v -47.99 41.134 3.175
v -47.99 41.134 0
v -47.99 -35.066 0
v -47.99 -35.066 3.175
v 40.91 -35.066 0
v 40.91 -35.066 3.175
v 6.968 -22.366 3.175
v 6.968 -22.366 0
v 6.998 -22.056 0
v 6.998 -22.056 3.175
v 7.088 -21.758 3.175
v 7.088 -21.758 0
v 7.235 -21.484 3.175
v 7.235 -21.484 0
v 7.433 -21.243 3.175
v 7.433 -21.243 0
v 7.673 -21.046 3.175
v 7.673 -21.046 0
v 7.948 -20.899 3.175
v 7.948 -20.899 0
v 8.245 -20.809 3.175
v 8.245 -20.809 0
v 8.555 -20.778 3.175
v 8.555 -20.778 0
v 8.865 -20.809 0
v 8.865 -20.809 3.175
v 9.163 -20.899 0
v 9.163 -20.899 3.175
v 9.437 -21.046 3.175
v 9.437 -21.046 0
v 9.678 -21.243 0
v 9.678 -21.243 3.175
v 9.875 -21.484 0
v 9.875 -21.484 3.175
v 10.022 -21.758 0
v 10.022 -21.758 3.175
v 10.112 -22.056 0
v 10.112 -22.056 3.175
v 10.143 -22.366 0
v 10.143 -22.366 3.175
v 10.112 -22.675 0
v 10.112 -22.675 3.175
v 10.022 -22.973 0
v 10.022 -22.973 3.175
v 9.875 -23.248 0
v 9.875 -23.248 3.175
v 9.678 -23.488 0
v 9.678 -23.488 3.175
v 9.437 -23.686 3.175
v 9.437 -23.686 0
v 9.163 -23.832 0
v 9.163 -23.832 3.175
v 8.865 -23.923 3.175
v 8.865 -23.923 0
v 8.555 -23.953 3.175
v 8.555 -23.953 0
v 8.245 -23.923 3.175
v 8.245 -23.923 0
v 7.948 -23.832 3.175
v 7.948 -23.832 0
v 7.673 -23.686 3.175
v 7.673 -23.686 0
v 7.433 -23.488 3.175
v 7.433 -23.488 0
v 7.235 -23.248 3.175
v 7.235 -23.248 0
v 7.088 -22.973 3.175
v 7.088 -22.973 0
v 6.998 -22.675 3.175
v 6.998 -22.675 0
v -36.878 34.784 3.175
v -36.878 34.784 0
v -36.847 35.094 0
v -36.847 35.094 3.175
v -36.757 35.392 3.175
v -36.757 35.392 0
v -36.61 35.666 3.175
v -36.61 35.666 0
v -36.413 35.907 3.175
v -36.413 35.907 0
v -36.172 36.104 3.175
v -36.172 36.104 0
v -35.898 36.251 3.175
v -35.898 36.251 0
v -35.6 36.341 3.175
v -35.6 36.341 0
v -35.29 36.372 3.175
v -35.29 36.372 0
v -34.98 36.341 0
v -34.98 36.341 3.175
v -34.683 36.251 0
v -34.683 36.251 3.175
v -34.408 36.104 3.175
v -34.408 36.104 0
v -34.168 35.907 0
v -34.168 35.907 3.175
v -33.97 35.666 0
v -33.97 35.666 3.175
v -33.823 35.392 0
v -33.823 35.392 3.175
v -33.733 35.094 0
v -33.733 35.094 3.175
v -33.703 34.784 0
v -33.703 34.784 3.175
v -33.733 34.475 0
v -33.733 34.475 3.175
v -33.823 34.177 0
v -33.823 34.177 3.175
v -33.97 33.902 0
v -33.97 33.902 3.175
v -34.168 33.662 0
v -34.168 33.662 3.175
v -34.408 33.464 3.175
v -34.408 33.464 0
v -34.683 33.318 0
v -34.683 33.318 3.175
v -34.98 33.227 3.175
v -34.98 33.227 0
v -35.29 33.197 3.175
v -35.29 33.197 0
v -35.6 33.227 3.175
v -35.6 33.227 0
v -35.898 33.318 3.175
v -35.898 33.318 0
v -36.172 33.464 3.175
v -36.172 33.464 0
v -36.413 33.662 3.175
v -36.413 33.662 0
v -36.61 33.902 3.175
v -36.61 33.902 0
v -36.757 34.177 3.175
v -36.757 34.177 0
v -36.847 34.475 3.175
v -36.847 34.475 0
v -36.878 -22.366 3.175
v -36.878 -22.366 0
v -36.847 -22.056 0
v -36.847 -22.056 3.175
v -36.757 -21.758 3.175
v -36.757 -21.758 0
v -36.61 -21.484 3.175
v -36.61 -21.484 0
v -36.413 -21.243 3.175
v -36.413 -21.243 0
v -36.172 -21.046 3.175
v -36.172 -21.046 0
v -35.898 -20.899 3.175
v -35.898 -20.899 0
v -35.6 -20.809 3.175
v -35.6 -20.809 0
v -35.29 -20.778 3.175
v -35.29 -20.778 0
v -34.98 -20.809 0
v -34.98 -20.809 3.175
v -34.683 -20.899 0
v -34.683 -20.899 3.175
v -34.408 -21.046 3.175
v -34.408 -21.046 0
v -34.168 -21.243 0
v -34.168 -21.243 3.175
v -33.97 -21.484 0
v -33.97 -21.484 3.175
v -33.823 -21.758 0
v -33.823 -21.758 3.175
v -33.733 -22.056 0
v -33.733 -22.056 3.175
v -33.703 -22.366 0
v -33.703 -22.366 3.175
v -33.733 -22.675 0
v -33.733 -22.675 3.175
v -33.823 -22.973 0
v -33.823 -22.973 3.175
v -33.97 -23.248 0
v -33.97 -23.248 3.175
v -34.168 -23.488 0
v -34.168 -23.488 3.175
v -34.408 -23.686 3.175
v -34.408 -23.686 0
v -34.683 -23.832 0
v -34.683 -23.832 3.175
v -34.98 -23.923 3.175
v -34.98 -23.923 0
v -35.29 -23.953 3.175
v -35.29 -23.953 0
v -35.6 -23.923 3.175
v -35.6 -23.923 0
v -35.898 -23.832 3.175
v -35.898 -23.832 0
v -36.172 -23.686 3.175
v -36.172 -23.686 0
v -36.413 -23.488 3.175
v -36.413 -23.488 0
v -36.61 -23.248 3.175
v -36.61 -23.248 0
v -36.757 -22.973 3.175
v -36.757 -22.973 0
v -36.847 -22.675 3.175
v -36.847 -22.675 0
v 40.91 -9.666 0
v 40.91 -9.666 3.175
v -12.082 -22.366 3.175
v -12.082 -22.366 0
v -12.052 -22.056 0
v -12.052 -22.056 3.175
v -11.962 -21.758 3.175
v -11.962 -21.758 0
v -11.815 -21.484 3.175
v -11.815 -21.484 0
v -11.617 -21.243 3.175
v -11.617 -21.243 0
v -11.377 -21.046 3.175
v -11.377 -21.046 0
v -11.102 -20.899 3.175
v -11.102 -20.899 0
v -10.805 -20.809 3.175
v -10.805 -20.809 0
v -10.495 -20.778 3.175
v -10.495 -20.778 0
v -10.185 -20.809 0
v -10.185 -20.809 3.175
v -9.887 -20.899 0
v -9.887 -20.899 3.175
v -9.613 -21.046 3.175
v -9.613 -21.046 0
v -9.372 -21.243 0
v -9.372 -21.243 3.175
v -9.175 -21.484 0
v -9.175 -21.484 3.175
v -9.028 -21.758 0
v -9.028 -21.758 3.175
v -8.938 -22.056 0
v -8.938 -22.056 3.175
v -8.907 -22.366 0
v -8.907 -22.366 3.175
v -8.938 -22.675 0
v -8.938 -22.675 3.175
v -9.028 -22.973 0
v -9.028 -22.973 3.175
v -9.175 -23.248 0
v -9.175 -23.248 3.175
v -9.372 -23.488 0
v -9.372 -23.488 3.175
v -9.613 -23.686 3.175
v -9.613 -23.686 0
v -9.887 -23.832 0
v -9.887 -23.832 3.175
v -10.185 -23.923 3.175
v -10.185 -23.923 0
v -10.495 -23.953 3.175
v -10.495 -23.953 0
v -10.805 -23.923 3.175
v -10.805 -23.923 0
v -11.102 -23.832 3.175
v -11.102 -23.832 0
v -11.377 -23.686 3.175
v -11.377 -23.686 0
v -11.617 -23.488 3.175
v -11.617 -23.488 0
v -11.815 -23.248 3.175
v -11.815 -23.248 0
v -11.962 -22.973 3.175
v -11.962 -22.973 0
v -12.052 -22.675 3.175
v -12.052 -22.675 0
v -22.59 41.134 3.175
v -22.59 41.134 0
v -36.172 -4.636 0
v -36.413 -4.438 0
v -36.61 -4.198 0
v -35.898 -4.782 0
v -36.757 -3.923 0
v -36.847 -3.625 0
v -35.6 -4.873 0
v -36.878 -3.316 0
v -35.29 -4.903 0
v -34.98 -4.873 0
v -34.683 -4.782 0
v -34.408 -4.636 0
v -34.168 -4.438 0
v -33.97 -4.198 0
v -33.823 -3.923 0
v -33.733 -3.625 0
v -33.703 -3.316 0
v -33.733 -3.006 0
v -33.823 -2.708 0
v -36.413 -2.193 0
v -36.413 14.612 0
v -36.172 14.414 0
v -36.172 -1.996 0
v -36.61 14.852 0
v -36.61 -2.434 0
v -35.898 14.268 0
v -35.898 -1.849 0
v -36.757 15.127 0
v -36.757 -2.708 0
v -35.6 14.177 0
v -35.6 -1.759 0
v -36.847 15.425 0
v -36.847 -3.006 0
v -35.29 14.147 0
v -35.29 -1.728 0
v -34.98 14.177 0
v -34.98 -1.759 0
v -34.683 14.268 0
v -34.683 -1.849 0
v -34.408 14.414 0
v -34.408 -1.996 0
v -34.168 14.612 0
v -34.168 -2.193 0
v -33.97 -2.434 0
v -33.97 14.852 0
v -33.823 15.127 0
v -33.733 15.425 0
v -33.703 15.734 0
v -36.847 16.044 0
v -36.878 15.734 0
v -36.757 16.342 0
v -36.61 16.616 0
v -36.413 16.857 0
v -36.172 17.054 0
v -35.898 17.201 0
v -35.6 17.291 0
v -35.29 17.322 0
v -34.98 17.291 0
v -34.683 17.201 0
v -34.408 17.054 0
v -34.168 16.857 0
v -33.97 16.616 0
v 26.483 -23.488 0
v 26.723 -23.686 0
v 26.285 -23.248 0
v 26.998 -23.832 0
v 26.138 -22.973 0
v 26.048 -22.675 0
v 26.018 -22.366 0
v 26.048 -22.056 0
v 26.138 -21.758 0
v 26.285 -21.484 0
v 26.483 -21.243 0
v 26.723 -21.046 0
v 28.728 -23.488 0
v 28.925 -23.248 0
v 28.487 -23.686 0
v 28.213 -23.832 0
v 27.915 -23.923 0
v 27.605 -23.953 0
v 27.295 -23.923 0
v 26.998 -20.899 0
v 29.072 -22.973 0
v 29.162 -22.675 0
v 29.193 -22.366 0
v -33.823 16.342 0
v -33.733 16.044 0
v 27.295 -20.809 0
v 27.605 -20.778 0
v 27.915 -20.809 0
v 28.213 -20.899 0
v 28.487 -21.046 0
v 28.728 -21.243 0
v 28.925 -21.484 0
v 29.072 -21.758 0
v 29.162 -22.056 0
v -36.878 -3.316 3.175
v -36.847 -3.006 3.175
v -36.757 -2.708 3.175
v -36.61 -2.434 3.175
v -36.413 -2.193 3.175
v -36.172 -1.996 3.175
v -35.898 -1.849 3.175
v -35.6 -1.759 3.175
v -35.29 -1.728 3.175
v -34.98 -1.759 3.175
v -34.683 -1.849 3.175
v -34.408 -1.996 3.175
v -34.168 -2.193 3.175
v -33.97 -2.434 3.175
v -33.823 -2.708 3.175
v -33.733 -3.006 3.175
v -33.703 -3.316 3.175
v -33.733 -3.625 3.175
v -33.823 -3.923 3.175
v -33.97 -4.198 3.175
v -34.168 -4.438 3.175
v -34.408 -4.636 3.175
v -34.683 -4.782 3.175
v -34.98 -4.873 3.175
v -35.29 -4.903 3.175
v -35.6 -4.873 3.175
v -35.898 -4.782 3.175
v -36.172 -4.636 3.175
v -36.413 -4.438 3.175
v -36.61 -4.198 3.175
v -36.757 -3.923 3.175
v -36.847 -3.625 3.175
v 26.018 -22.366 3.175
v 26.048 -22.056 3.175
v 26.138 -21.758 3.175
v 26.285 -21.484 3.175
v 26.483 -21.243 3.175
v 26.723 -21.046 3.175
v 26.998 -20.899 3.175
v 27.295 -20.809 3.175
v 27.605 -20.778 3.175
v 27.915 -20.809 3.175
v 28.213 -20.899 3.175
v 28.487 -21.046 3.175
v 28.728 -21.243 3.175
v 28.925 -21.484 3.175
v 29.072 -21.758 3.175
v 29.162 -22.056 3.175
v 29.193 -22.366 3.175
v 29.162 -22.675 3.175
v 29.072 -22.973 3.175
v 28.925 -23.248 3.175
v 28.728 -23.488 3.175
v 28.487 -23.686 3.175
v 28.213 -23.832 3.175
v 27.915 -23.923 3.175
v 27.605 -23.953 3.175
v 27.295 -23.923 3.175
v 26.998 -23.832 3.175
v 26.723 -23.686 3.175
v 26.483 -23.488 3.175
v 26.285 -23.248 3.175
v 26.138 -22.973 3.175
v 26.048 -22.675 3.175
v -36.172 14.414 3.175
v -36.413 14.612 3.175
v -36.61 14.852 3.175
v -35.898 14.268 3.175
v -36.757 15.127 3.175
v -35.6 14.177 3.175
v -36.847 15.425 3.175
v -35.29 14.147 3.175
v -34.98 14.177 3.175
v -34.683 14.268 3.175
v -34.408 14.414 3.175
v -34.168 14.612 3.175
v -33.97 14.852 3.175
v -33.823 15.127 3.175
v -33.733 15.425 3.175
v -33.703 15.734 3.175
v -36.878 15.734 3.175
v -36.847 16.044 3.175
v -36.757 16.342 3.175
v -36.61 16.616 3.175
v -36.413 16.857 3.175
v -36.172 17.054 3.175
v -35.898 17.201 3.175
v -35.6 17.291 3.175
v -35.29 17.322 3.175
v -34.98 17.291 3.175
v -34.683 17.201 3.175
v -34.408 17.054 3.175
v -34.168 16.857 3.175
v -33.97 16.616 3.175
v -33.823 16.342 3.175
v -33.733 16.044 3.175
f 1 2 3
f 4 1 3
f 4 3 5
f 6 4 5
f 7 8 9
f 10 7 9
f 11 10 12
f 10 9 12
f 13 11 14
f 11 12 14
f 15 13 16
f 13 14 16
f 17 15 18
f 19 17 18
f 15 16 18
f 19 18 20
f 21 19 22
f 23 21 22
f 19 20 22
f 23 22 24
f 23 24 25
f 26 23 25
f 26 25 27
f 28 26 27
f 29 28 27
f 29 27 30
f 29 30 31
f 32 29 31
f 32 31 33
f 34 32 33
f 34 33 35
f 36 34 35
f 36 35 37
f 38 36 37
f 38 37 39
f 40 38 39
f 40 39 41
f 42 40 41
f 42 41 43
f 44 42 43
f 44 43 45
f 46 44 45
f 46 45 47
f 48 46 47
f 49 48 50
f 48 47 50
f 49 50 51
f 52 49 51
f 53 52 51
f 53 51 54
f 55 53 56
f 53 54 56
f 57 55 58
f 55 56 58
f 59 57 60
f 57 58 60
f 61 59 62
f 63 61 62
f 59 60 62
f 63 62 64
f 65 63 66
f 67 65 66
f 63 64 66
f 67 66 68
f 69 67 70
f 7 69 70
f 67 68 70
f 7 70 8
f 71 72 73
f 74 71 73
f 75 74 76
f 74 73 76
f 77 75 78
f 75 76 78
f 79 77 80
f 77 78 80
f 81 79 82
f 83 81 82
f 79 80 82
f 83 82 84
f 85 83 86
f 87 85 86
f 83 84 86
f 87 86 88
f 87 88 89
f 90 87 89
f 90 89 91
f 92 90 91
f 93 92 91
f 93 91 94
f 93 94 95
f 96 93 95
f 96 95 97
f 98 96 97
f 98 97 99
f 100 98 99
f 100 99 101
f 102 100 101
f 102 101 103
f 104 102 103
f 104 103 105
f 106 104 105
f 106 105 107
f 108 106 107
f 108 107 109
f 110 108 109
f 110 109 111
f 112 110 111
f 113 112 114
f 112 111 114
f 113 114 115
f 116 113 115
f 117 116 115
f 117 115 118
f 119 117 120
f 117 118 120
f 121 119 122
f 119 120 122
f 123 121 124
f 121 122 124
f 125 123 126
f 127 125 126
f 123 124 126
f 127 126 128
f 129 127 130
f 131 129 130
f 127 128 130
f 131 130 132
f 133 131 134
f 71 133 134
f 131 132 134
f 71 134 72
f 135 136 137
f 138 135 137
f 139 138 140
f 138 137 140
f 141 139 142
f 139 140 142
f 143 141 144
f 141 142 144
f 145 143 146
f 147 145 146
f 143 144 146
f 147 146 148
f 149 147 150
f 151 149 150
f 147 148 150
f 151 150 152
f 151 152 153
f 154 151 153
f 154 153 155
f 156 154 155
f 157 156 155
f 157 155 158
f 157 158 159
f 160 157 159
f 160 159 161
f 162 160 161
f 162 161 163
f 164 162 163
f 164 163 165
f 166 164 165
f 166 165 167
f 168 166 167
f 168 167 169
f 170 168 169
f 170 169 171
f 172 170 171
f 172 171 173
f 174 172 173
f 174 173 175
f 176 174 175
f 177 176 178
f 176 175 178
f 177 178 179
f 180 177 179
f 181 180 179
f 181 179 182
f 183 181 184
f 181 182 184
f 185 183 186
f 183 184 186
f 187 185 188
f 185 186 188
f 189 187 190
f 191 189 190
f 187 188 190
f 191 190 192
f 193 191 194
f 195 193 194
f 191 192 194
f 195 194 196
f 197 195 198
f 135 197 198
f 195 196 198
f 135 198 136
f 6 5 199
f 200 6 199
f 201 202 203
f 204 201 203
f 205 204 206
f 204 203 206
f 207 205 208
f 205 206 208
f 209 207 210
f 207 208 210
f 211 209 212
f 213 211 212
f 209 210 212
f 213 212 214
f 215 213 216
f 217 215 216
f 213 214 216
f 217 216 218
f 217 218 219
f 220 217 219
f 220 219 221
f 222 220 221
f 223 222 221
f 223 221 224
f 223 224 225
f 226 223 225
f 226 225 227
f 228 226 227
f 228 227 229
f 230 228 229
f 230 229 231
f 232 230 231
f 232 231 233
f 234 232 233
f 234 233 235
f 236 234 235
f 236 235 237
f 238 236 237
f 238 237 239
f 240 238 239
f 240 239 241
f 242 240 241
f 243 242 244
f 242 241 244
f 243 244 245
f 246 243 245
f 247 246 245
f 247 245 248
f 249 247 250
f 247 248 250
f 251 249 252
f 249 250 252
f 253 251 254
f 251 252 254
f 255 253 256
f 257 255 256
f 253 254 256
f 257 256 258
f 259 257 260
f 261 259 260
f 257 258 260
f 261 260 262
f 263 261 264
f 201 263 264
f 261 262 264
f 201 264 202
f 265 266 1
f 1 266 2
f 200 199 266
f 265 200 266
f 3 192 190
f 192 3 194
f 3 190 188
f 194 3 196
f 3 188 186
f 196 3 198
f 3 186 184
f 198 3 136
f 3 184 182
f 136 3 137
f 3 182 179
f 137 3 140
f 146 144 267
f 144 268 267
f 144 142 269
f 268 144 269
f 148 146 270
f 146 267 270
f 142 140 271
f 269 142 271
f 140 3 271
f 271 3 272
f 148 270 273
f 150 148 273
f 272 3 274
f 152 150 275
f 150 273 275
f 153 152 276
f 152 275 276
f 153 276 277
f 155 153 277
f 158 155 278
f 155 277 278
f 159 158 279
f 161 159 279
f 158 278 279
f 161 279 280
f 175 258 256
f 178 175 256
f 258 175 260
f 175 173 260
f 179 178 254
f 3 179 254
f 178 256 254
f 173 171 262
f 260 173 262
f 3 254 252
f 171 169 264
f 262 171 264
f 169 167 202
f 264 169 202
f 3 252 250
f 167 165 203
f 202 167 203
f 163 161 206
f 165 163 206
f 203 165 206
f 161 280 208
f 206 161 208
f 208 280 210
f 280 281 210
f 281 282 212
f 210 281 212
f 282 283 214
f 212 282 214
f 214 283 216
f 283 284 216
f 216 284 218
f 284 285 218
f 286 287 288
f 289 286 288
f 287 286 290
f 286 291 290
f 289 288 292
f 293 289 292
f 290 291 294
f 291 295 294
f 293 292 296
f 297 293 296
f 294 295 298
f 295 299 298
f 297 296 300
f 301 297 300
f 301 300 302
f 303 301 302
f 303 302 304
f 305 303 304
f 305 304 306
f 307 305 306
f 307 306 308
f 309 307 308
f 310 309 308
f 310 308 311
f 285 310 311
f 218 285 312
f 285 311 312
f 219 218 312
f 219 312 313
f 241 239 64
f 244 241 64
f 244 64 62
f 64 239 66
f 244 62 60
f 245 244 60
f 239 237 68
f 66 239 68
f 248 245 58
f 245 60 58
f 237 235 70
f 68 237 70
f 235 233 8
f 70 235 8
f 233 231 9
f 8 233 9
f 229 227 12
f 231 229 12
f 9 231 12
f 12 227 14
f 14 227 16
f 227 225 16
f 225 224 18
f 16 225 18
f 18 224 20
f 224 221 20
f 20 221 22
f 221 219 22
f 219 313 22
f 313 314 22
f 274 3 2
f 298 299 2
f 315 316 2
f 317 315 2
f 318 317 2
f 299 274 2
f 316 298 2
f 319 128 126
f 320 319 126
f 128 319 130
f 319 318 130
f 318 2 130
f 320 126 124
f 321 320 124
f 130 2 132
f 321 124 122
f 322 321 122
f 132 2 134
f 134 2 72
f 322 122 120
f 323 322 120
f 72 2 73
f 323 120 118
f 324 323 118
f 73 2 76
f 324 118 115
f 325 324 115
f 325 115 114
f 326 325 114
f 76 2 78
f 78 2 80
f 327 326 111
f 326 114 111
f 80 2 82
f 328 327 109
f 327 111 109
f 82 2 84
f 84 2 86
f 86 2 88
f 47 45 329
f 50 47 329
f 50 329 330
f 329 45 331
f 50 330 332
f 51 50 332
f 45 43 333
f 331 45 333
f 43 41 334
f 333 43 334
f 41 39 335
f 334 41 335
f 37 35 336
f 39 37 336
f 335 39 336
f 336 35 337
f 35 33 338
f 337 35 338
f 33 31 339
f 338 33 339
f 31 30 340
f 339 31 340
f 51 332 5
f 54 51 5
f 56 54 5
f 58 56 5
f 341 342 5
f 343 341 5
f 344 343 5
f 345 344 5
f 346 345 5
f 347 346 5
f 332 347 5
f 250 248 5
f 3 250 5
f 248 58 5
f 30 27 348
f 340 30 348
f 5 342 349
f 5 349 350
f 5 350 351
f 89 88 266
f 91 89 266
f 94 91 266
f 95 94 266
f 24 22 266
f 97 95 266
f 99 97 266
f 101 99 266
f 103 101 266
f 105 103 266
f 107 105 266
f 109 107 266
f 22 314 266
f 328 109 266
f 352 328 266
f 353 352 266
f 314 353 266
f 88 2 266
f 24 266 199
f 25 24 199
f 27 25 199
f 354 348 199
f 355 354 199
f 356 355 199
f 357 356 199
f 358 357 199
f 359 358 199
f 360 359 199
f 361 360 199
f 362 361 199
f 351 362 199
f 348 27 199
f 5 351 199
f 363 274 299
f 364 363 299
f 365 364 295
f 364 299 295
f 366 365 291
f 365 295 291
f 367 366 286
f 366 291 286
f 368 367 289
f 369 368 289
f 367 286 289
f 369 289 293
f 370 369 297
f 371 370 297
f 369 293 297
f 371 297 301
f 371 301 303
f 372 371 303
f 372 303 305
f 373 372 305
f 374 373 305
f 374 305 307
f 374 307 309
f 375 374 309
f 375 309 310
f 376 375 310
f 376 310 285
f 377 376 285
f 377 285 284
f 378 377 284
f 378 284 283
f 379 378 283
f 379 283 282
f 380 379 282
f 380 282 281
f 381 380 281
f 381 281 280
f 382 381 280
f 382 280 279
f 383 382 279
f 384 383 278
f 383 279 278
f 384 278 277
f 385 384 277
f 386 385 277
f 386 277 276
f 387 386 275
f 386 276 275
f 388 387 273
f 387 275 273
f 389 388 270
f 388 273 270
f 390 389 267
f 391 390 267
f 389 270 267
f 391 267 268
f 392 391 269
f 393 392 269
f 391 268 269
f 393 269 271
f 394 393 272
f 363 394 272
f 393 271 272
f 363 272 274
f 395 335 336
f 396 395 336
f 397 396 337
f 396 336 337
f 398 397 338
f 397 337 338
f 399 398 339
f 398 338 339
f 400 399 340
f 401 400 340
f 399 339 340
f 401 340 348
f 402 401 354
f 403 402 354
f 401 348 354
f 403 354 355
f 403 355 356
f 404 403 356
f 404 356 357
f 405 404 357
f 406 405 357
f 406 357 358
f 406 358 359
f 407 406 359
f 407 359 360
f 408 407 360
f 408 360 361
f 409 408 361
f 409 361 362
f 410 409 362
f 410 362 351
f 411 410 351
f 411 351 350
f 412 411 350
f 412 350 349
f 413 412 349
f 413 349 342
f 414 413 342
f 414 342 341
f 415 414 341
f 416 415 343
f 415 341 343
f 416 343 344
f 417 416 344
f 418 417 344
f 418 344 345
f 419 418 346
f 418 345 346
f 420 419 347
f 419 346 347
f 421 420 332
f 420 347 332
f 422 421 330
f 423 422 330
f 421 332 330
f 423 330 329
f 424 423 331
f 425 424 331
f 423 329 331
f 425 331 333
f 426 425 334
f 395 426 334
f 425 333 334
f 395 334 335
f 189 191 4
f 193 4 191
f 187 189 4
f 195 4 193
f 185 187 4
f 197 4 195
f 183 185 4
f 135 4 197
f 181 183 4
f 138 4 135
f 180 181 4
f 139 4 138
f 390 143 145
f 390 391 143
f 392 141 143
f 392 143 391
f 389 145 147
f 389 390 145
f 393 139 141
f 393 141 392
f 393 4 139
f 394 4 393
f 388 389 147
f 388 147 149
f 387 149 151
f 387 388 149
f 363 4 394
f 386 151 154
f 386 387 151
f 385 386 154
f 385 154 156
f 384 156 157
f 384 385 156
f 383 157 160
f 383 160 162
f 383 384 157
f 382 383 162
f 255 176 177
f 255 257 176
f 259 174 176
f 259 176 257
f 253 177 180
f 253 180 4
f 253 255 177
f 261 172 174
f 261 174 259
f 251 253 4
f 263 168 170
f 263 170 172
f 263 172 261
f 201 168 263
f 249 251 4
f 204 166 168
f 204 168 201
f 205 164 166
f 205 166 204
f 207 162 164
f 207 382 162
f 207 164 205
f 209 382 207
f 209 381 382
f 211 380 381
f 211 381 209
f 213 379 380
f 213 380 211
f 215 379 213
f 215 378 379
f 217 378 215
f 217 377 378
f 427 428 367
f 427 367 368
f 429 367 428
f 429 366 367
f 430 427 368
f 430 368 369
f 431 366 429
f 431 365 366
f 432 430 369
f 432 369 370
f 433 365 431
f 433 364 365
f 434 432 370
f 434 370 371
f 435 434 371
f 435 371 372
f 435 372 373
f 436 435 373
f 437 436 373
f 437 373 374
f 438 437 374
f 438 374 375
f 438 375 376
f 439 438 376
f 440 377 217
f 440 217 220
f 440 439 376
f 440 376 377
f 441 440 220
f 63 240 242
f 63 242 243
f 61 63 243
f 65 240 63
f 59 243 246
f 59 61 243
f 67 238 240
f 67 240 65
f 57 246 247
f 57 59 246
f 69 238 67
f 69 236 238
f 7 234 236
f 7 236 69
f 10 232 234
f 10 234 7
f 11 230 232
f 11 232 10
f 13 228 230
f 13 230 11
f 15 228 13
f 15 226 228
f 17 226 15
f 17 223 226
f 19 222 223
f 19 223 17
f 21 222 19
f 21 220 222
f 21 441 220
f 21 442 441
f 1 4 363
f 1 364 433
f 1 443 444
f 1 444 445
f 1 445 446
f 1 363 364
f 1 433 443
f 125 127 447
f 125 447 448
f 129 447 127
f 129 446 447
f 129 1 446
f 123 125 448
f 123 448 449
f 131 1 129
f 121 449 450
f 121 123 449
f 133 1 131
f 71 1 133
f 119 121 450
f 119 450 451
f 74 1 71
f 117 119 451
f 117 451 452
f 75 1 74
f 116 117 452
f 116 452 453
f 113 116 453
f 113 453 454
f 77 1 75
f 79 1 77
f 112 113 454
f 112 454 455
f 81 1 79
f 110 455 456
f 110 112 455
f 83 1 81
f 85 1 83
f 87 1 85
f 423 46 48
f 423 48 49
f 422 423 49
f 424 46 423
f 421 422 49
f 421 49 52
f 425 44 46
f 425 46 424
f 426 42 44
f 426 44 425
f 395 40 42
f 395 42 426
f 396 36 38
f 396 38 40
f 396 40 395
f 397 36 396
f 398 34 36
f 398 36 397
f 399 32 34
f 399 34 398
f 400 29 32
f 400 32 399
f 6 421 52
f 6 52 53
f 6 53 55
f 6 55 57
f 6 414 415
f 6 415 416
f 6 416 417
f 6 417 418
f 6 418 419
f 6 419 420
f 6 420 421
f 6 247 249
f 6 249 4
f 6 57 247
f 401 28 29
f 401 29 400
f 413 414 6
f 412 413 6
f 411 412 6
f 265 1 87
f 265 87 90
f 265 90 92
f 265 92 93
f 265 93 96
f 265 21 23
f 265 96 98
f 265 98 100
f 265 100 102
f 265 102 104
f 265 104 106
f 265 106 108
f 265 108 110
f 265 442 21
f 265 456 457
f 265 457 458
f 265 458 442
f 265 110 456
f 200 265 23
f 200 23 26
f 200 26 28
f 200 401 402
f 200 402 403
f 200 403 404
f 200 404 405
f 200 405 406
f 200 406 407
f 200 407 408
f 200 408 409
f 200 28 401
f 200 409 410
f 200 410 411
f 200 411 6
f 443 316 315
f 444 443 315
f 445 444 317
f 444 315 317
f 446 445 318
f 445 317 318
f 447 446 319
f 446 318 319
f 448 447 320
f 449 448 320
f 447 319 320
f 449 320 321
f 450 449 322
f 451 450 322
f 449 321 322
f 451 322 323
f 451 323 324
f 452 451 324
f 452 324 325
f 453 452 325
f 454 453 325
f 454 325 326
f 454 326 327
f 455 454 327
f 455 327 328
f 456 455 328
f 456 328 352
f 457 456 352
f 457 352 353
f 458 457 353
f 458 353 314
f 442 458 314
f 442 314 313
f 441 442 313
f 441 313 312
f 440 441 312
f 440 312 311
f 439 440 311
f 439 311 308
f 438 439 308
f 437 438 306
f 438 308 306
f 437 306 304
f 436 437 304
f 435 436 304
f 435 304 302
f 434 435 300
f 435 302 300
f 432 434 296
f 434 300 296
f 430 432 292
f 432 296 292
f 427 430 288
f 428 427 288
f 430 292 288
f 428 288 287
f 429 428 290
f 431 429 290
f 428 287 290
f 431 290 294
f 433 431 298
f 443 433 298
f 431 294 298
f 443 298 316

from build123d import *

# Parameters (mm, degrees)
BOSS_EXTRUDE1_DEPTH = 3.175
SKETCH2_R           = 1.5875
CUT_EXTRUDE1_DEPTH  = 64.286370995


with BuildPart() as part:
    # Sketch1 → Boss-Extrude1 (new body)
    with BuildSketch(Plane.XY):
        Polygon((40.909912505, -35.06563929), (40.909912505, -9.66563929), (-22.590087495, 41.13436071), (-47.990087495, 41.13436071), (-47.990087495, -35.06563929), align=None)
    extrude(amount=BOSS_EXTRUDE1_DEPTH)

    # Sketch2 → Cut-Extrude1 (cut, through all)
    with BuildSketch(Plane(origin=(0, 0, 0), x_dir=(-1, 0, 0), z_dir=(0, 0, -1))):
        with Locations((35.290087495, -22.36563929)):
            Circle(SKETCH2_R)
        with Locations((35.290087495, -3.31563929)):
            Circle(SKETCH2_R)
        with Locations((35.290087495, 15.73436071)):
            Circle(SKETCH2_R)
        with Locations((35.290087495, 34.78436071)):
            Circle(SKETCH2_R)
        with Locations((10.494914026, -22.36563929)):
            Circle(SKETCH2_R)
        with Locations((-8.555085974, -22.36563929)):
            Circle(SKETCH2_R)
        with Locations((-27.605085974, -22.36563929)):
            Circle(SKETCH2_R)
    extrude(amount=-CUT_EXTRUDE1_DEPTH, mode=Mode.SUBTRACT)


solid = part.part
